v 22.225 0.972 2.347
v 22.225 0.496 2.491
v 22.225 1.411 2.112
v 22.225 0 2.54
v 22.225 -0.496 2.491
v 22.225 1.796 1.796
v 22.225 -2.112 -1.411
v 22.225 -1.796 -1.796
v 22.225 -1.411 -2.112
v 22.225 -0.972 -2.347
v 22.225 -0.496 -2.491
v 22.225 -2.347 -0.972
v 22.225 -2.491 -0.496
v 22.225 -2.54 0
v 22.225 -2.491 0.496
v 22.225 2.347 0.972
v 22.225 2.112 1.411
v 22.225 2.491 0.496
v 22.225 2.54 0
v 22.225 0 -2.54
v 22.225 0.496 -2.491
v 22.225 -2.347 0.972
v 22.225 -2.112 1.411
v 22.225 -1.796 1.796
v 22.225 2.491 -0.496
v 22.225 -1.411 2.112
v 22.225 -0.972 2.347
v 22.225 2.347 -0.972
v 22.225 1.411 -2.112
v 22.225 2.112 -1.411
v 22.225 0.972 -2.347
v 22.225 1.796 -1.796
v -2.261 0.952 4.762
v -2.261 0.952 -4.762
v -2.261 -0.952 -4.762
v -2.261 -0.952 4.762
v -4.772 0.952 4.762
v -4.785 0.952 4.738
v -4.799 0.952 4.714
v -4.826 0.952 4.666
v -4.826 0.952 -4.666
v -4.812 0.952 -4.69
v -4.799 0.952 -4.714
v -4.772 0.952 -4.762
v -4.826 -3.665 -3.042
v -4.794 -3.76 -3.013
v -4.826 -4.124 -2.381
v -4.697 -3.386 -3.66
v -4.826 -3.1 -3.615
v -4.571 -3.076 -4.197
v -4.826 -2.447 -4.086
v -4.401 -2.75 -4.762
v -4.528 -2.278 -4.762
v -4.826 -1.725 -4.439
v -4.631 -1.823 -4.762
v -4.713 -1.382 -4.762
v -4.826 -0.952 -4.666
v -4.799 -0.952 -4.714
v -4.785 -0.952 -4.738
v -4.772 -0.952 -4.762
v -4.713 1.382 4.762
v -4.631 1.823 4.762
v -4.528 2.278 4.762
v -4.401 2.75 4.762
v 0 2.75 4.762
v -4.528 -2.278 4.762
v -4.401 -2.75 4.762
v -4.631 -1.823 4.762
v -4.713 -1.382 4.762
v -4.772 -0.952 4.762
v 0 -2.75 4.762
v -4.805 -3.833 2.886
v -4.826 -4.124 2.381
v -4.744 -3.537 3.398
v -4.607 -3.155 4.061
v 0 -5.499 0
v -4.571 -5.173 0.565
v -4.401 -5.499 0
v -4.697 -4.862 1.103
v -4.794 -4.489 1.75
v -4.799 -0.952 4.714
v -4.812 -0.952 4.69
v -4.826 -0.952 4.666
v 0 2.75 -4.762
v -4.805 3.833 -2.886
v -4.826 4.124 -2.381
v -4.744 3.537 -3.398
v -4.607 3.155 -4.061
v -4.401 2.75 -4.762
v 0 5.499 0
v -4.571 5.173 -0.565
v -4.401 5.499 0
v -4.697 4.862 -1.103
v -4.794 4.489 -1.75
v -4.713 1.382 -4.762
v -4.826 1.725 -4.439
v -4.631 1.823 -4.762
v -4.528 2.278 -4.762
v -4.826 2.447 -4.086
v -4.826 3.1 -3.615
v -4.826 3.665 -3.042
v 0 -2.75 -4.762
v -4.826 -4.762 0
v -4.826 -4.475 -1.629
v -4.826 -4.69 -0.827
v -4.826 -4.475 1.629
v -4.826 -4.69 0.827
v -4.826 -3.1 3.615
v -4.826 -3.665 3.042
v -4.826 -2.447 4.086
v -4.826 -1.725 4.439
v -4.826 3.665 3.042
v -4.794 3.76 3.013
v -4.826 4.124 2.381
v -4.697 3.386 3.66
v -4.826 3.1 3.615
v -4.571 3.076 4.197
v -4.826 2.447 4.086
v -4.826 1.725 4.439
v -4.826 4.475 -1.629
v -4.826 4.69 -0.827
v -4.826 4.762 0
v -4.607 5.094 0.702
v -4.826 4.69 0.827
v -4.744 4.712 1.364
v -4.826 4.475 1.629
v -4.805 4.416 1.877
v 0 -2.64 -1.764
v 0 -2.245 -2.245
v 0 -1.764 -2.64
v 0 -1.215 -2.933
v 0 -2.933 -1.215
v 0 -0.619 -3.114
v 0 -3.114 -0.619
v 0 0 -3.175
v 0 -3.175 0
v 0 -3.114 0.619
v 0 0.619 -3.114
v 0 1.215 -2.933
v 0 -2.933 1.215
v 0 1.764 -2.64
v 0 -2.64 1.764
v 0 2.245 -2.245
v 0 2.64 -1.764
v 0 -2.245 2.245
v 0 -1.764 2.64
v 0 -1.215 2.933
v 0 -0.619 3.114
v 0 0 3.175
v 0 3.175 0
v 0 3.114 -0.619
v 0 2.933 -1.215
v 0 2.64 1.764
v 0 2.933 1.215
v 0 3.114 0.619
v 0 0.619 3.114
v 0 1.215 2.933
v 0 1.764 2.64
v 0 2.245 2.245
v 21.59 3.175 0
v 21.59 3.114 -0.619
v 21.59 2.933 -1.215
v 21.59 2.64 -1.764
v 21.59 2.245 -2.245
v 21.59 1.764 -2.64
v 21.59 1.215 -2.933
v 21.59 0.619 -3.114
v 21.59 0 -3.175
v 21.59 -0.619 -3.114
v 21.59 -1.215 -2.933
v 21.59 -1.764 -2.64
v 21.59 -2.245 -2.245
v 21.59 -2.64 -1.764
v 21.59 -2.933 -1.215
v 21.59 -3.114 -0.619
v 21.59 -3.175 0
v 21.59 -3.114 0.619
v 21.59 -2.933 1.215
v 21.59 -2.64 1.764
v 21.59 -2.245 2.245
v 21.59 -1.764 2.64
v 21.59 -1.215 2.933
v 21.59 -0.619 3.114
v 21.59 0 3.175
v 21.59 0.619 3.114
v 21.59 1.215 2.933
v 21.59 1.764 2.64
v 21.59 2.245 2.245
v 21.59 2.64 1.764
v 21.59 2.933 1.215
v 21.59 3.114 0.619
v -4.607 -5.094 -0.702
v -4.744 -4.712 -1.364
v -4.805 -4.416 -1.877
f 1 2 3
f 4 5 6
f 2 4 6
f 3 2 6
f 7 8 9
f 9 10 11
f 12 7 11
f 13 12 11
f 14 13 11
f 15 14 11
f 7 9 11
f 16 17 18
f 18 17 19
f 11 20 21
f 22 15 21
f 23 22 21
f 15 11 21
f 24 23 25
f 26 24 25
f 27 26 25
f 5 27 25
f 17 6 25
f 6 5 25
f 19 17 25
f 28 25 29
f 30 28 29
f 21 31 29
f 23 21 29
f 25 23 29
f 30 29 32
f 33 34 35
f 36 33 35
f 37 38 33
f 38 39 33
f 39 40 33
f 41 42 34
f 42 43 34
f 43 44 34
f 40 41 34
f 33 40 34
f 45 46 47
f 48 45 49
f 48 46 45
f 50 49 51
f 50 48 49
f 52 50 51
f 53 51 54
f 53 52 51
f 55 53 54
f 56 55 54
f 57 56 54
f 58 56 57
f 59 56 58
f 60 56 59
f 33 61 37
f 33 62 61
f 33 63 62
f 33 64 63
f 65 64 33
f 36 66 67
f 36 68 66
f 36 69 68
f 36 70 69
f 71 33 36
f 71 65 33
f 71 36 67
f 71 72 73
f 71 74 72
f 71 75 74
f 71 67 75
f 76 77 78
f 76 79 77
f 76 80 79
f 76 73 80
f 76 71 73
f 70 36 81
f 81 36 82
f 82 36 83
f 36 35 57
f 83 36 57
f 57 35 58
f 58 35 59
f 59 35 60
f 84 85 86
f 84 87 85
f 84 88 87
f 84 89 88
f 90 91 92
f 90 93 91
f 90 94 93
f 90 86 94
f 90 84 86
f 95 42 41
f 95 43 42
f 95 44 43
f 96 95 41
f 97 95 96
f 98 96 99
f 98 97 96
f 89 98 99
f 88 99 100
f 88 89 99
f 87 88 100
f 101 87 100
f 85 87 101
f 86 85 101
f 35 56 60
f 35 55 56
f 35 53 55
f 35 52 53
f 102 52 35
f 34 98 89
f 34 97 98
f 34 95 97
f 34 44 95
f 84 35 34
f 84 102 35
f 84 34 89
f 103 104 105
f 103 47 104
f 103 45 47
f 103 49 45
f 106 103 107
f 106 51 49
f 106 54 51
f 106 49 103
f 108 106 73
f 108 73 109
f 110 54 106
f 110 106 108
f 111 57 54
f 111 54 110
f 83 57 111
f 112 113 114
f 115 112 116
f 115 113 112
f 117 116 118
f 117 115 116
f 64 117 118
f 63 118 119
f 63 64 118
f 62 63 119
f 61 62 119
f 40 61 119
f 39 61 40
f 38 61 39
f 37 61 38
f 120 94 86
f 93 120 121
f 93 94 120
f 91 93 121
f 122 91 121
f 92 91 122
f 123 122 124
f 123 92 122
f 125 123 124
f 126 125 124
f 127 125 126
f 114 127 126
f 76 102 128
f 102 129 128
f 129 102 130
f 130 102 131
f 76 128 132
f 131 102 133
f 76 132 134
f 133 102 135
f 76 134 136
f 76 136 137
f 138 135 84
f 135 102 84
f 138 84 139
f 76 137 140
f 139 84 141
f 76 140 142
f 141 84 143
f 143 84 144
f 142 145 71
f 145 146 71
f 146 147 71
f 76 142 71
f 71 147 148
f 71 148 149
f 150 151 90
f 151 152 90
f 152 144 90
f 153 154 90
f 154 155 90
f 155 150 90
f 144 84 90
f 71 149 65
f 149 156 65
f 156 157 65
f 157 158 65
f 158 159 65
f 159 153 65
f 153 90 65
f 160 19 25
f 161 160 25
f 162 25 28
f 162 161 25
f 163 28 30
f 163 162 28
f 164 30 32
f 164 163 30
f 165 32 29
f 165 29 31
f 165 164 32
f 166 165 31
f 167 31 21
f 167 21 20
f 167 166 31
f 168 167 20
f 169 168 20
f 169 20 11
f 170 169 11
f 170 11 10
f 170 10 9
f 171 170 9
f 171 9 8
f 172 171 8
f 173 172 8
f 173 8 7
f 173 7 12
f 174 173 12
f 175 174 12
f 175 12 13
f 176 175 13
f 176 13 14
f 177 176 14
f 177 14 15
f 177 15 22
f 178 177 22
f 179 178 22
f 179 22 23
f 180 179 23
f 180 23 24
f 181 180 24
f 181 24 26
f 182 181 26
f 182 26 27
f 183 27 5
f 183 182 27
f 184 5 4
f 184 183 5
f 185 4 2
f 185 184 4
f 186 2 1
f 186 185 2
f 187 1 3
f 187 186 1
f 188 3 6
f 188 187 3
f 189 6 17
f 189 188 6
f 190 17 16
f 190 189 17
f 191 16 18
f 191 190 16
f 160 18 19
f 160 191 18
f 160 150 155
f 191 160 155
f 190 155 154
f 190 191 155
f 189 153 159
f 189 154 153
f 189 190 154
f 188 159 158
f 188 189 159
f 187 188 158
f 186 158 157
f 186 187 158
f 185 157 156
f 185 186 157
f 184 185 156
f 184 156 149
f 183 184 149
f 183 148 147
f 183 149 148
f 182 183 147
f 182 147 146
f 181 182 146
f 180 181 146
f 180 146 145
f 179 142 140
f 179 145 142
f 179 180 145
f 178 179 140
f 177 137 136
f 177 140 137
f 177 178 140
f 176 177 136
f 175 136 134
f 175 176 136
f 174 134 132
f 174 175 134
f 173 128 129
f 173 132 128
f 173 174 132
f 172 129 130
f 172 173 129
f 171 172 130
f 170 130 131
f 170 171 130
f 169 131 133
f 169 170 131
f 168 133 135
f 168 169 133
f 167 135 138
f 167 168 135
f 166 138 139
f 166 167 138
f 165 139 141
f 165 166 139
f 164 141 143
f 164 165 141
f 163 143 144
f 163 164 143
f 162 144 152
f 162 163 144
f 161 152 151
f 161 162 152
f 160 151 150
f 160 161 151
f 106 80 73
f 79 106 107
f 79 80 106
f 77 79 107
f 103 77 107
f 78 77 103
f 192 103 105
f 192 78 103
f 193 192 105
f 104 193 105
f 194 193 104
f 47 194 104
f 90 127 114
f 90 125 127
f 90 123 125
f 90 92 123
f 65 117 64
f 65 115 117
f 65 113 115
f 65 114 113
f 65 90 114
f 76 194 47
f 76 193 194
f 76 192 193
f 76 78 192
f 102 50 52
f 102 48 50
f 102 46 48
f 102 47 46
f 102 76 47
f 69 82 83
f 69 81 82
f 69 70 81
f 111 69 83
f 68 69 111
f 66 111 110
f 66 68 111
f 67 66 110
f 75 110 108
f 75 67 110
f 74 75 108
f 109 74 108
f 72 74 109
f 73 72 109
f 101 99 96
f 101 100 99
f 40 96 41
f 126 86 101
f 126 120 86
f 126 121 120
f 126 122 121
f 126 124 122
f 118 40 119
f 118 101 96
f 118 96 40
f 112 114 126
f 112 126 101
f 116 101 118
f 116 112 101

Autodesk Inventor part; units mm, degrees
ref_plane "YZ Plane" through (0, 0, 0) normal (1, 0, 0) x (0, 1, 0)
ref_plane "XZ Plane" through (0, 0, 0) normal (0, 1, 0) x (-1, 0, 0)
sketch "Sketch1" plane through (0, 0, 0) normal (0, 0, 1) x (1, 0, 0)
  line L0 (0, 3.175) -> (22.225, 3.175)
  line L1 (22.225, 3.175) -> (22.225, 0)
  line L2 (22.225, 0) -> (0, 0)
  line L3 (-4.445, 0) -> (26.67, 0) projected
  line L4 (0, -0.635) -> (0, 3.81) projected
  line L5 (0, 3.175) -> (0, 0)
  dimension "d1" = 6.35
  dimension "d52" = 22.225
revolve "Body" add sketch "Sketch1" angle 360 about axis through (22.225, 0, 0) along (-1, 0, 0)
sketch "Sketch2" plane through (0, 0, 0) normal (-1, 0, 0) x (0, 0, 1)
  line L0 (0, 5.4993) -> (4.7625, 2.7496)
  line L1 (4.7625, 2.7496) -> (4.7625, -2.7496)
  line L2 (4.7625, -2.7496) -> (0, -5.4993)
  line L3 (0, -5.4993) -> (-4.7625, -2.7496)
  line L4 (-4.7625, -2.7496) -> (-4.7625, 2.7496)
  line L5 (-4.7625, 2.7496) -> (0, 5.4993)
  line L6 (-6.6675, 0) -> (6.6675, 0) projected
  line L7 (0, 7.699) -> (0, -7.699) projected
  point P0 (0, 0)
  point P1 (0, 0)
  dimension "d10" = 9.525
extrude "Head" add sketch "Sketch2" along normal blind 4.826
sketch "Sketch3" plane through (0, 0, 0) normal (0, 0, 1) x (1, 0, 0)
  line L0 (-4.826, 0.9525) -> (-2.2606, 0.9525)
  line L1 (-2.2606, 0.9525) -> (-2.2606, -0.9525)
  line L2 (-2.2606, -0.9525) -> (-4.826, -0.9525)
  line L3 (-4.826, -0.9525) -> (-4.826, 0.9525)
  line L4 (-2.2606, 0) -> (-4.826, 0) construction
  line L5 (-5.3391, 0) -> (-1.7475, 0) projected
  line L6 (-4.826, 2.7496) -> (-4.826, -2.7496) projected
  dimension "d11" = 1.905
  dimension "d13" = 2.5654
extrude "Slot" cut sketch "Sketch3" along normal through all both and the other way through all
sketch "Sketch4" plane through (0, 0, 0) normal (0, 0, 1) x (1, 0, 0)
  line L0 (-4.826, 4.7625) -> (-4.826, 5.4993)
  line L1 (-4.826, 5.4993) -> (-4.4006, 5.4993)
  line L2 (-4.4006, 5.4993) -> (-4.826, 4.7625)
  line L3 (-4.4006, 5.4993) -> (-4.826, 5.4993)
  line L4 (-4.826, 5.4993) -> (-4.826, 4.7625)
  line L5 (-4.826, 5.4993) -> (-4.826, 2.7496) projected
  line L6 (-5.7912, 0) -> (0.9652, 0) projected
  line L7 (0, 5.4993) -> (-4.826, 5.4993) projected
  dimension "d4" = 30
  dimension "d17" = 9.525
revolve "Chamfer1" cut sketch "Sketch4" angle 360 about axis through (-10, 0, 0) along (1, 0, 0)
thread "Thread" size "1/4-20 UNC" class "2A" standard "ANSI Unified Screw Threads" length 19.05
chamfer "Chamfer2" distance 0.635 distance2 0.6351 1 edges at (22.225, -3.175, 0) measured on face at (22.225, -0.1276, -1.0506)
ref_plane "Work Plane1" through (60, 0, 0) normal (0, 0, 1) x (1, 0, 0)
equation "\"d1\" = GD"
equation "\"d52\" = NLG"
equation "\"d10\" = SW"
equation "\"d2\" = KOH - SD"
equation "\"d11\" = SBR"
equation "\"d13\" = STI"
equation "\"d4\" = ANG1"
equation "\"d17\" = SW0"
equation "\"d15\" = GEL"
equation "\"d5\" = -0.5 * SPD + 0.5 * GD"
equation "\"NLG\" = 22.225"
equation "\"GD\" = NND"
equation "\"KOH\" = 4.826"
equation "\"GEL\" = 19.05"
equation "\"SW\" = 9.525"
equation "\"SW0\" = 9.525"
equation "\"SPD\" = GD1"
equation "\"SD2\" = NND"
equation "\"SD\" = 0"
equation "\"ANG1\" = 30deg"
equation "\"GUL\" = -0.5 * GD1 + 0.5 * NND"
equation "\"STI\" = 2.5654"
equation "\"SBR\" = 1.905"
equation "\"RR\" = 0.57912"
equation "\"THREADDIA\" = 6.35"
equation "\"TOA\" = 30deg"
equation "\"BDM\" = NND"
equation "\"FAWI\" = 45deg"
equation "\"NND\" = 6.35"
equation "\"E0\" = 1.155 * SW"
equation "\"GAL\" = 0.635"
equation "\"GD1\" = 5.08"
properties part number "ANSI B18.6.3 - 1/4-20x0.875, SHHMSI" material "Steel, Mild"
